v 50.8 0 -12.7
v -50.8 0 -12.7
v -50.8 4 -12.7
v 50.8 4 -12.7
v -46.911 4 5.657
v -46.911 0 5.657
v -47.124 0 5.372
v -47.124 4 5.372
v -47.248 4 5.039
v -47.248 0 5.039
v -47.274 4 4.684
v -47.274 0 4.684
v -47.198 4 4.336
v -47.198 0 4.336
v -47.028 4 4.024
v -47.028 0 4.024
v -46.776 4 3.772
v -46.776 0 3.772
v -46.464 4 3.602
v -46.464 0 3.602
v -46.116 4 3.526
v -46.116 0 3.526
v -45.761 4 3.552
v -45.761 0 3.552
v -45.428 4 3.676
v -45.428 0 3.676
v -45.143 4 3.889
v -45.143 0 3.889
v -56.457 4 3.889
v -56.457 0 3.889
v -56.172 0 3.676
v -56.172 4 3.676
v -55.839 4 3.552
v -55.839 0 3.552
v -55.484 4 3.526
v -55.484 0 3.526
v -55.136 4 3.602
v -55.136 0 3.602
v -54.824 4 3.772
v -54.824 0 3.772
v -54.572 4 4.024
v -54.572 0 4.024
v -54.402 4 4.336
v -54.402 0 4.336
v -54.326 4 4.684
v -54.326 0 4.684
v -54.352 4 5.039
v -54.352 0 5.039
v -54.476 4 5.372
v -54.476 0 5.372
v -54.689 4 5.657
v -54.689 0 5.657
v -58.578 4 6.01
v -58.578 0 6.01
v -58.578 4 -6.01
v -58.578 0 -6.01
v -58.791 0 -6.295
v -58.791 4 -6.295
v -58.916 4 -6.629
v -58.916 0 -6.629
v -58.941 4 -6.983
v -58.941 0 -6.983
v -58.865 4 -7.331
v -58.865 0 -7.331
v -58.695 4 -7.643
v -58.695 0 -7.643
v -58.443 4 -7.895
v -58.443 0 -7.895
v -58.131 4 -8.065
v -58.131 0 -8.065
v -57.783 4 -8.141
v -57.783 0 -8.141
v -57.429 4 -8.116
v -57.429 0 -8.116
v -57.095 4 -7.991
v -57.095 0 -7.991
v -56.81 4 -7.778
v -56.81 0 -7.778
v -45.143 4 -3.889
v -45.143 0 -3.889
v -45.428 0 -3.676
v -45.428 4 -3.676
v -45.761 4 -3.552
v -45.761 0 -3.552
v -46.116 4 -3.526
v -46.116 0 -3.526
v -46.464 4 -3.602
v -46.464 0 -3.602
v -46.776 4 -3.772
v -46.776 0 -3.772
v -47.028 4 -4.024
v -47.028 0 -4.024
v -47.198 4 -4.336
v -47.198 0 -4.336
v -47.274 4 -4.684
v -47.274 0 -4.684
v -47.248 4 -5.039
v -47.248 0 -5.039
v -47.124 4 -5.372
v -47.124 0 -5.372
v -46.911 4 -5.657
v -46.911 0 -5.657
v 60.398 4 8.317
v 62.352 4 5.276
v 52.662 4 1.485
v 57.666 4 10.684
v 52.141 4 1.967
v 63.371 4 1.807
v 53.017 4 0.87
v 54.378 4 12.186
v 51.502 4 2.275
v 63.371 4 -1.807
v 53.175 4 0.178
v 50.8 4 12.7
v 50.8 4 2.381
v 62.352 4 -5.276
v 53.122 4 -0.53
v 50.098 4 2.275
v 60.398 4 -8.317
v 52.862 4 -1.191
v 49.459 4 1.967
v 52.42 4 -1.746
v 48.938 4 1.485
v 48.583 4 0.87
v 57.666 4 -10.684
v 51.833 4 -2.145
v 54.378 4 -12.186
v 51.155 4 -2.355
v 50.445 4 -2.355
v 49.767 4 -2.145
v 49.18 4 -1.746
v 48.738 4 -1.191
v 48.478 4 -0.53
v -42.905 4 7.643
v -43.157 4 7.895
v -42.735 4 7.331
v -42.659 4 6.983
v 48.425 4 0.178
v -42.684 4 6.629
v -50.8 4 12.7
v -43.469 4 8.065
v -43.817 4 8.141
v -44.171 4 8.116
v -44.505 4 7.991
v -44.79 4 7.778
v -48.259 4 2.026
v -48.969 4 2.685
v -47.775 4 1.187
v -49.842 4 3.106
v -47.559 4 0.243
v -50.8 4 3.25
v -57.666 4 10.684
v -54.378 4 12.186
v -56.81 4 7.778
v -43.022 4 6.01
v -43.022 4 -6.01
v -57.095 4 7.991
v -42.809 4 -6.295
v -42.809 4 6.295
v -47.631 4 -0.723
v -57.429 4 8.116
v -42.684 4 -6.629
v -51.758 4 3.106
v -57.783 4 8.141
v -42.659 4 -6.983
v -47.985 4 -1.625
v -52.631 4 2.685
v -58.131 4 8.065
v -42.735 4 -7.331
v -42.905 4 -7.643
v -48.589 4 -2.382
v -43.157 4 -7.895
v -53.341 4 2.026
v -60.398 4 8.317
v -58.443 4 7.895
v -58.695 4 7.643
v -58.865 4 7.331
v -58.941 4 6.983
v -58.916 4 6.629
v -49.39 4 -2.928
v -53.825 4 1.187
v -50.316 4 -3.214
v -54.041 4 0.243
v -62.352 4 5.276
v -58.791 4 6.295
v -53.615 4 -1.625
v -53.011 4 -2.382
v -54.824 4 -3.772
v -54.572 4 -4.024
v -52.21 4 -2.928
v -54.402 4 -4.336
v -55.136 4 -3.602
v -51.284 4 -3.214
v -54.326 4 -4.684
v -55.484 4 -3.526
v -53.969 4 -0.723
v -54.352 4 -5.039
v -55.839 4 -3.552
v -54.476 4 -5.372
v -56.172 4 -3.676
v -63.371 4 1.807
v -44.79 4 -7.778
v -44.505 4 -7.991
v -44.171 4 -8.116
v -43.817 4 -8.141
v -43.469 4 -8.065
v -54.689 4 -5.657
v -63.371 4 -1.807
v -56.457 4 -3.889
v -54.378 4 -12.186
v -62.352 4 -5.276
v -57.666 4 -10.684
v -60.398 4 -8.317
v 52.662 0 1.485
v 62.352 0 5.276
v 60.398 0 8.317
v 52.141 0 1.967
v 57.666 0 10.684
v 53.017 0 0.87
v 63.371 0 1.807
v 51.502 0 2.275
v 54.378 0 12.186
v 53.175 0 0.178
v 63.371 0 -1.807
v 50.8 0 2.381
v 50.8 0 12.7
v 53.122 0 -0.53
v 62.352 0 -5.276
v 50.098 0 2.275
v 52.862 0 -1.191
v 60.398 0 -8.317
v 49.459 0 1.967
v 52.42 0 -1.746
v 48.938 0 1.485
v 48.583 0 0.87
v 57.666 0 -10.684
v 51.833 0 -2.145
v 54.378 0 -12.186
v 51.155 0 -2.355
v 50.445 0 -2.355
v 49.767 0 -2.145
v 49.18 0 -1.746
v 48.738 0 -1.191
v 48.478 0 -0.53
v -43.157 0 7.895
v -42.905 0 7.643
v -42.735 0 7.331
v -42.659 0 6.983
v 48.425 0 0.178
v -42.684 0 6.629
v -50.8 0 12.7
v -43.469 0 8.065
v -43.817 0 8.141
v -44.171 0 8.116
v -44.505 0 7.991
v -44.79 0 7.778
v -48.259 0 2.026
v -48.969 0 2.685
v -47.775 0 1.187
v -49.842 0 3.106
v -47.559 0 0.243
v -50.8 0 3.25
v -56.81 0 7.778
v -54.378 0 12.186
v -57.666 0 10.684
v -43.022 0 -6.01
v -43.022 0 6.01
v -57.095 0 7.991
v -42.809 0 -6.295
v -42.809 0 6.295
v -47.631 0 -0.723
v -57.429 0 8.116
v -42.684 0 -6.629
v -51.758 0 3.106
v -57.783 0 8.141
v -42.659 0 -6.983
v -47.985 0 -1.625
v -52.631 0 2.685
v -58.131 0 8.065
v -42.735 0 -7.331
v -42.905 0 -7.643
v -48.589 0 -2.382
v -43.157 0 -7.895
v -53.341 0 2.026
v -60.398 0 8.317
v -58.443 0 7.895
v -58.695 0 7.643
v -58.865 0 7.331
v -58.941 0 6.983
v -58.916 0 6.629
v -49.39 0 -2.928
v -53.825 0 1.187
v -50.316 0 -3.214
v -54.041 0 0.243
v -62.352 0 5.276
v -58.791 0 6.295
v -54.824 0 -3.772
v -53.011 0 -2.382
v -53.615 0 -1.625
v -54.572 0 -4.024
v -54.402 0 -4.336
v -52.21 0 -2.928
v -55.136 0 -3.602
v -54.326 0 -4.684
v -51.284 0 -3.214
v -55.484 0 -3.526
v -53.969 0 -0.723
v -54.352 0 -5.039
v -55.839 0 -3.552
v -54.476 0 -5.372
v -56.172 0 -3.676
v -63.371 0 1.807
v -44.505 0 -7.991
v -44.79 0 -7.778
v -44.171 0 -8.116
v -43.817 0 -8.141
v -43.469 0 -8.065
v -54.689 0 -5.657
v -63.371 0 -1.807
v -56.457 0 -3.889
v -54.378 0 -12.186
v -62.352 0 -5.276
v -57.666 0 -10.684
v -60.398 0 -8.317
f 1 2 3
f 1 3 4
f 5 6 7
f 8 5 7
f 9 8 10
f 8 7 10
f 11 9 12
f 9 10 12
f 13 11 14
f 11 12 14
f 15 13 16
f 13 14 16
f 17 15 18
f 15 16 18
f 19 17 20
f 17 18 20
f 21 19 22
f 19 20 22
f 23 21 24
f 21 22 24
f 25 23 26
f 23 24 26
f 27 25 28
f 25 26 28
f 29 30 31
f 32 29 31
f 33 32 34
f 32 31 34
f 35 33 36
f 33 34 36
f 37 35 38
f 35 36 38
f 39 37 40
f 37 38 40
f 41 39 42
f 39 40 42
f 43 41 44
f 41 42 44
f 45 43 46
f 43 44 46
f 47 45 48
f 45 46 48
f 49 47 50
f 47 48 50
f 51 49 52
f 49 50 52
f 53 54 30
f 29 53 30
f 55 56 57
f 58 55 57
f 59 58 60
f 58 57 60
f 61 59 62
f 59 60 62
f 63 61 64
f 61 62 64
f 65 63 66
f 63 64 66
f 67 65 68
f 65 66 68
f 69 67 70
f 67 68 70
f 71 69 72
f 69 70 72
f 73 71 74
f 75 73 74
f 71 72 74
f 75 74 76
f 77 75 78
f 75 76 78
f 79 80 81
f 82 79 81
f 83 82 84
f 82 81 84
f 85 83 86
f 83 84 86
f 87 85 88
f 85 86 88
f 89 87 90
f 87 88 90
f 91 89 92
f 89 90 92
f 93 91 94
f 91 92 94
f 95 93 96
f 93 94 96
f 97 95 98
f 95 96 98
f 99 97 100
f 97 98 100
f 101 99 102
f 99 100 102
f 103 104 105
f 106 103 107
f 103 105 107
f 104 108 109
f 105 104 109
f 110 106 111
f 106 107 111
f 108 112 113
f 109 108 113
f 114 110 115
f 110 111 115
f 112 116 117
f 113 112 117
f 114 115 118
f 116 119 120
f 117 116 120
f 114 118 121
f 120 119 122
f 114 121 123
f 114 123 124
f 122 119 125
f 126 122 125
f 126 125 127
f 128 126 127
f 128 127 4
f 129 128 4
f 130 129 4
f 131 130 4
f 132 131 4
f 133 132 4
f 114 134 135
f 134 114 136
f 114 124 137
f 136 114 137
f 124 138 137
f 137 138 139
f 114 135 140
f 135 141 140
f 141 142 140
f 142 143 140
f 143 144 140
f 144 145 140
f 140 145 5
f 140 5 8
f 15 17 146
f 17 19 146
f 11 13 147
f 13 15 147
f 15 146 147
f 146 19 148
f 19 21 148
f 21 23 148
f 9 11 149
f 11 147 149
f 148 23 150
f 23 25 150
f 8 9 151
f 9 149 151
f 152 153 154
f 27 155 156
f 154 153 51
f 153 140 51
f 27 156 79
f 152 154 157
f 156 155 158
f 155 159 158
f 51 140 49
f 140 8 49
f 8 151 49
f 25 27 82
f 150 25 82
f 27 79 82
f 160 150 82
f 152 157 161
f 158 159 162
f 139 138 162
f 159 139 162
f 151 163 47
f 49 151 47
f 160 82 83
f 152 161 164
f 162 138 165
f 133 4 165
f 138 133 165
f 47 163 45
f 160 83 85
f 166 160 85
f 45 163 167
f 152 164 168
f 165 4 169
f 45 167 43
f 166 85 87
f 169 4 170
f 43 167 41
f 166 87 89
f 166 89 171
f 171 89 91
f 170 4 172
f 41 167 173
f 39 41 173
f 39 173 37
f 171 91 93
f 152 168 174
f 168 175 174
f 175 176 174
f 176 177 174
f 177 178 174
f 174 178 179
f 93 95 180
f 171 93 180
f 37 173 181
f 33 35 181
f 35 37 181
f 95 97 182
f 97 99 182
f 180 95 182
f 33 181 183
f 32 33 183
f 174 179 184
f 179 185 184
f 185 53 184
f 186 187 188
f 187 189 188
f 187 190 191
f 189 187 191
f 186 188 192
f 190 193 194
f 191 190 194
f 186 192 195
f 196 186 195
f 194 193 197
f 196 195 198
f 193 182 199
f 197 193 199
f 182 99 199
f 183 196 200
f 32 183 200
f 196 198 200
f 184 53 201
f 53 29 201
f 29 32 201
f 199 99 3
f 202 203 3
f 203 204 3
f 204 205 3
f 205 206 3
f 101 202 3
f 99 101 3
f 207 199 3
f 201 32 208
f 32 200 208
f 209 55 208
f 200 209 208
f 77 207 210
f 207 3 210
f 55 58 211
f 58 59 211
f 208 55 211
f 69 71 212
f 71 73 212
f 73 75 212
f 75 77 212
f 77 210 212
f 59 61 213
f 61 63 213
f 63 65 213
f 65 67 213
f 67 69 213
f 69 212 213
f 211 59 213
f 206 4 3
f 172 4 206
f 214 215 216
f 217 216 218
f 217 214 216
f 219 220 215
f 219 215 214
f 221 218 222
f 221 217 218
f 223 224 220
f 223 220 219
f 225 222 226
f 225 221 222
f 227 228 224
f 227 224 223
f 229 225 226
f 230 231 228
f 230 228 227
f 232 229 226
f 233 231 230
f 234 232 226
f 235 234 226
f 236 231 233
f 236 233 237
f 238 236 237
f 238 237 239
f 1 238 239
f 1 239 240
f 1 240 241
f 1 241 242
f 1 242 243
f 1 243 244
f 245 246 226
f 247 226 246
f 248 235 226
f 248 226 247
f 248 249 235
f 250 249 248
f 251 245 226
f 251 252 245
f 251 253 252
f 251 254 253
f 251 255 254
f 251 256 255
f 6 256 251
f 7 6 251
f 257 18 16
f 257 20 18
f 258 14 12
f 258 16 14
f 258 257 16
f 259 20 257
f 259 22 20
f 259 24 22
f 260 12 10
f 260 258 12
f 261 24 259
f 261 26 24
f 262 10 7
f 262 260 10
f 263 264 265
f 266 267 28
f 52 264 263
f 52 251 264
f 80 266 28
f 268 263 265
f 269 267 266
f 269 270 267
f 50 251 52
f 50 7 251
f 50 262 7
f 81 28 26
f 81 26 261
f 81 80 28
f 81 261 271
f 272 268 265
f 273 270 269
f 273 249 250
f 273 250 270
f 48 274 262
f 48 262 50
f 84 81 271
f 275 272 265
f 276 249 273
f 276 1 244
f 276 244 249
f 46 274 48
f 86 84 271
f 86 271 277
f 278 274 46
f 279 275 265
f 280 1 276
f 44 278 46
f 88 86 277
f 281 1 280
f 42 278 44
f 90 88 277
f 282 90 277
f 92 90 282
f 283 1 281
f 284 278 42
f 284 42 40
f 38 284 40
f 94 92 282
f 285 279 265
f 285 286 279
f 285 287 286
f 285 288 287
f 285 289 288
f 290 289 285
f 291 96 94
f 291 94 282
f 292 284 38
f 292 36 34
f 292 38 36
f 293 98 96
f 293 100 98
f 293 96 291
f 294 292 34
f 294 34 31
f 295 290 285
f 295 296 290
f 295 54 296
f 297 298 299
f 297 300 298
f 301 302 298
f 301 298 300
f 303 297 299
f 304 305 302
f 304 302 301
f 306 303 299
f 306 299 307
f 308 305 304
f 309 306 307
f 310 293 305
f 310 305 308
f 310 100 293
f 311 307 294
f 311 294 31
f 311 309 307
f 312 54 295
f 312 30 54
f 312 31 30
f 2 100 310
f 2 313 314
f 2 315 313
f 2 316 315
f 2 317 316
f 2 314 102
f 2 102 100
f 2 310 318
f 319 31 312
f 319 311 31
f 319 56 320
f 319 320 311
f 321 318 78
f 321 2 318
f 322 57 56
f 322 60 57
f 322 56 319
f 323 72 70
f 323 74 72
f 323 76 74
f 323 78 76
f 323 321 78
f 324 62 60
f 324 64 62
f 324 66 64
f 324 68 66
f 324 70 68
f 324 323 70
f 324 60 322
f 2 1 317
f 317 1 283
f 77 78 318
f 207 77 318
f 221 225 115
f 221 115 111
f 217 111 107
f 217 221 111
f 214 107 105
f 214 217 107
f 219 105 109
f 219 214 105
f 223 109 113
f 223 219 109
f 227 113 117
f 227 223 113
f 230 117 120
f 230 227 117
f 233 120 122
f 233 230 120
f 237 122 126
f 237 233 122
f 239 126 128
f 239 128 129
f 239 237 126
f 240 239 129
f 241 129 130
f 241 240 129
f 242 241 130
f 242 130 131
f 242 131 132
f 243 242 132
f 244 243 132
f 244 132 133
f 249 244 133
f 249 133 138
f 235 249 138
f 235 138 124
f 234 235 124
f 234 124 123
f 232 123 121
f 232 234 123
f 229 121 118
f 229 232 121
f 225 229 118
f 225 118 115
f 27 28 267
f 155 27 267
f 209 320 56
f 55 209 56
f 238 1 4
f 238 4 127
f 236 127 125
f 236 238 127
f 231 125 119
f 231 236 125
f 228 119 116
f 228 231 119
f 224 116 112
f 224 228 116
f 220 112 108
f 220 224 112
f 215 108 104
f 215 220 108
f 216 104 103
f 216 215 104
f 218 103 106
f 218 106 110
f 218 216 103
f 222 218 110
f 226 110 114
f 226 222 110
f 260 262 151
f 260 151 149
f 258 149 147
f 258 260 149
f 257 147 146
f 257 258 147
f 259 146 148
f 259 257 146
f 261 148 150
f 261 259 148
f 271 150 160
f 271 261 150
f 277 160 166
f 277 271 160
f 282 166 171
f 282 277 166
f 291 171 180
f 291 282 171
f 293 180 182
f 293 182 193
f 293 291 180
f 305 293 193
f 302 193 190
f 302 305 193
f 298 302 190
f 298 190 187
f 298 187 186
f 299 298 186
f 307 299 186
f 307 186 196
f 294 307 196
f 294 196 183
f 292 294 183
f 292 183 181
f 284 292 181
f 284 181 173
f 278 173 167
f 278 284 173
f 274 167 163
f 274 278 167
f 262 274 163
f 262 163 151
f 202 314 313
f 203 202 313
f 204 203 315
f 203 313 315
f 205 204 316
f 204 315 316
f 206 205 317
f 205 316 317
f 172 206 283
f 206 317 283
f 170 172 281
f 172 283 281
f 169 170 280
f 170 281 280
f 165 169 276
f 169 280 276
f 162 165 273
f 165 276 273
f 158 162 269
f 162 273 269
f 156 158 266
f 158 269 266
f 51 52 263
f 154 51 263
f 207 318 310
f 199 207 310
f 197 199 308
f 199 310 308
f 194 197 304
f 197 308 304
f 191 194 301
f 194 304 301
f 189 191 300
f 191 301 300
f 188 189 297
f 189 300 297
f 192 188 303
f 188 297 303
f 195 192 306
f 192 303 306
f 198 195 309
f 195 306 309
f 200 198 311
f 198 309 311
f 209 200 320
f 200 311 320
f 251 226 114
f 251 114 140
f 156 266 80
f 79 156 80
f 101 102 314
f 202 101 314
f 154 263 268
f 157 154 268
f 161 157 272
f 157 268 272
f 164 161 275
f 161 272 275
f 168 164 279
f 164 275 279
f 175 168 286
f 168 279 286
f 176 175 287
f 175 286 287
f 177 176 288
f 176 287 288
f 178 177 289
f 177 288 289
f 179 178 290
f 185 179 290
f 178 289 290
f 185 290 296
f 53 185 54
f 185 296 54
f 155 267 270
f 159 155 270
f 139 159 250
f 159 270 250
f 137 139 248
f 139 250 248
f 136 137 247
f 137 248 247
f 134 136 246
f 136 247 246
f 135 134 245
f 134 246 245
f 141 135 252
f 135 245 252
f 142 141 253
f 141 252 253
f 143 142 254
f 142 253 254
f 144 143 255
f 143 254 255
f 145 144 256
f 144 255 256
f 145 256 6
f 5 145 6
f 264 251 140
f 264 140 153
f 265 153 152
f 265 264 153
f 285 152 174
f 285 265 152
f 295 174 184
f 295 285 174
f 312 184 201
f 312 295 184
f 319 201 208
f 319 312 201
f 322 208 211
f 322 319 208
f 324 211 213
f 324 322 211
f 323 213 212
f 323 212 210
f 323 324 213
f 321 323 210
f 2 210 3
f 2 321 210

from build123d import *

# Parameters (mm, degrees)
SKETCH1_R           = 3.25
SKETCH1_R_2         = 2.38125
BOSS_EXTRUDE1_DEPTH = 4


with BuildPart() as part:
    # Sketch1 → Boss-Extrude1 (new body)
    with BuildSketch(Plane(origin=(0, 0, 0), x_dir=(1, 0, 0), z_dir=(0, 1, 0))):
        with BuildLine():
            Line((-50.8, 12.7), (50.8, 12.7))
            ThreePointArc((50.8, 12.7), (63.5, 0), (50.8, -12.7))
            Line((50.8, -12.7), (-50.8, -12.7))
            ThreePointArc((-50.8, -12.7), (-63.5, 0), (-50.8, 12.7))
        make_face()
        with Locations(Location((-50.8, 0, 0), (0, 0, 270))):
            Circle(SKETCH1_R, mode=Mode.SUBTRACT)
        with Locations(Location((50.8, 0, 0), (0, 0, 270))):
            Circle(SKETCH1_R_2, mode=Mode.SUBTRACT)
        with BuildLine():
            Line((-56.81040764, 7.778174593), (-54.689087297, 5.656854249))
            ThreePointArc((-54.689087297, 5.656854249), (-54.689087297, 3.889087297), (-56.456854249, 3.889087297))
            Line((-56.456854249, 3.889087297), (-58.578174593, 6.01040764))
            ThreePointArc((-58.578174593, 6.01040764), (-58.578174593, 7.778174593), (-56.81040764, 7.778174593))
        make_face(mode=Mode.SUBTRACT)
        with BuildLine():
            Line((-43.021825407, 6.01040764), (-45.143145751, 3.889087297))
            ThreePointArc((-45.143145751, 3.889087297), (-46.910912703, 3.889087297), (-46.910912703, 5.656854249))
            Line((-46.910912703, 5.656854249), (-44.78959236, 7.778174593))
            ThreePointArc((-44.78959236, 7.778174593), (-43.021825407, 7.778174593), (-43.021825407, 6.01040764))
        make_face(mode=Mode.SUBTRACT)
        with BuildLine():
            Line((-44.78959236, -7.778174593), (-46.910912703, -5.656854249))
            ThreePointArc((-46.910912703, -5.656854249), (-46.910912703, -3.889087297), (-45.143145751, -3.889087297))
            Line((-45.143145751, -3.889087297), (-43.021825407, -6.01040764))
            ThreePointArc((-43.021825407, -6.01040764), (-43.021825407, -7.778174593), (-44.78959236, -7.778174593))
        make_face(mode=Mode.SUBTRACT)
        with BuildLine():
            Line((-58.578174593, -6.01040764), (-56.456854249, -3.889087297))
            ThreePointArc((-56.456854249, -3.889087297), (-54.689087297, -3.889087297), (-54.689087297, -5.656854249))
            Line((-54.689087297, -5.656854249), (-56.81040764, -7.778174593))
            ThreePointArc((-56.81040764, -7.778174593), (-58.578174593, -7.778174593), (-58.578174593, -6.01040764))
        make_face(mode=Mode.SUBTRACT)
    extrude(amount=BOSS_EXTRUDE1_DEPTH)


solid = part.part
